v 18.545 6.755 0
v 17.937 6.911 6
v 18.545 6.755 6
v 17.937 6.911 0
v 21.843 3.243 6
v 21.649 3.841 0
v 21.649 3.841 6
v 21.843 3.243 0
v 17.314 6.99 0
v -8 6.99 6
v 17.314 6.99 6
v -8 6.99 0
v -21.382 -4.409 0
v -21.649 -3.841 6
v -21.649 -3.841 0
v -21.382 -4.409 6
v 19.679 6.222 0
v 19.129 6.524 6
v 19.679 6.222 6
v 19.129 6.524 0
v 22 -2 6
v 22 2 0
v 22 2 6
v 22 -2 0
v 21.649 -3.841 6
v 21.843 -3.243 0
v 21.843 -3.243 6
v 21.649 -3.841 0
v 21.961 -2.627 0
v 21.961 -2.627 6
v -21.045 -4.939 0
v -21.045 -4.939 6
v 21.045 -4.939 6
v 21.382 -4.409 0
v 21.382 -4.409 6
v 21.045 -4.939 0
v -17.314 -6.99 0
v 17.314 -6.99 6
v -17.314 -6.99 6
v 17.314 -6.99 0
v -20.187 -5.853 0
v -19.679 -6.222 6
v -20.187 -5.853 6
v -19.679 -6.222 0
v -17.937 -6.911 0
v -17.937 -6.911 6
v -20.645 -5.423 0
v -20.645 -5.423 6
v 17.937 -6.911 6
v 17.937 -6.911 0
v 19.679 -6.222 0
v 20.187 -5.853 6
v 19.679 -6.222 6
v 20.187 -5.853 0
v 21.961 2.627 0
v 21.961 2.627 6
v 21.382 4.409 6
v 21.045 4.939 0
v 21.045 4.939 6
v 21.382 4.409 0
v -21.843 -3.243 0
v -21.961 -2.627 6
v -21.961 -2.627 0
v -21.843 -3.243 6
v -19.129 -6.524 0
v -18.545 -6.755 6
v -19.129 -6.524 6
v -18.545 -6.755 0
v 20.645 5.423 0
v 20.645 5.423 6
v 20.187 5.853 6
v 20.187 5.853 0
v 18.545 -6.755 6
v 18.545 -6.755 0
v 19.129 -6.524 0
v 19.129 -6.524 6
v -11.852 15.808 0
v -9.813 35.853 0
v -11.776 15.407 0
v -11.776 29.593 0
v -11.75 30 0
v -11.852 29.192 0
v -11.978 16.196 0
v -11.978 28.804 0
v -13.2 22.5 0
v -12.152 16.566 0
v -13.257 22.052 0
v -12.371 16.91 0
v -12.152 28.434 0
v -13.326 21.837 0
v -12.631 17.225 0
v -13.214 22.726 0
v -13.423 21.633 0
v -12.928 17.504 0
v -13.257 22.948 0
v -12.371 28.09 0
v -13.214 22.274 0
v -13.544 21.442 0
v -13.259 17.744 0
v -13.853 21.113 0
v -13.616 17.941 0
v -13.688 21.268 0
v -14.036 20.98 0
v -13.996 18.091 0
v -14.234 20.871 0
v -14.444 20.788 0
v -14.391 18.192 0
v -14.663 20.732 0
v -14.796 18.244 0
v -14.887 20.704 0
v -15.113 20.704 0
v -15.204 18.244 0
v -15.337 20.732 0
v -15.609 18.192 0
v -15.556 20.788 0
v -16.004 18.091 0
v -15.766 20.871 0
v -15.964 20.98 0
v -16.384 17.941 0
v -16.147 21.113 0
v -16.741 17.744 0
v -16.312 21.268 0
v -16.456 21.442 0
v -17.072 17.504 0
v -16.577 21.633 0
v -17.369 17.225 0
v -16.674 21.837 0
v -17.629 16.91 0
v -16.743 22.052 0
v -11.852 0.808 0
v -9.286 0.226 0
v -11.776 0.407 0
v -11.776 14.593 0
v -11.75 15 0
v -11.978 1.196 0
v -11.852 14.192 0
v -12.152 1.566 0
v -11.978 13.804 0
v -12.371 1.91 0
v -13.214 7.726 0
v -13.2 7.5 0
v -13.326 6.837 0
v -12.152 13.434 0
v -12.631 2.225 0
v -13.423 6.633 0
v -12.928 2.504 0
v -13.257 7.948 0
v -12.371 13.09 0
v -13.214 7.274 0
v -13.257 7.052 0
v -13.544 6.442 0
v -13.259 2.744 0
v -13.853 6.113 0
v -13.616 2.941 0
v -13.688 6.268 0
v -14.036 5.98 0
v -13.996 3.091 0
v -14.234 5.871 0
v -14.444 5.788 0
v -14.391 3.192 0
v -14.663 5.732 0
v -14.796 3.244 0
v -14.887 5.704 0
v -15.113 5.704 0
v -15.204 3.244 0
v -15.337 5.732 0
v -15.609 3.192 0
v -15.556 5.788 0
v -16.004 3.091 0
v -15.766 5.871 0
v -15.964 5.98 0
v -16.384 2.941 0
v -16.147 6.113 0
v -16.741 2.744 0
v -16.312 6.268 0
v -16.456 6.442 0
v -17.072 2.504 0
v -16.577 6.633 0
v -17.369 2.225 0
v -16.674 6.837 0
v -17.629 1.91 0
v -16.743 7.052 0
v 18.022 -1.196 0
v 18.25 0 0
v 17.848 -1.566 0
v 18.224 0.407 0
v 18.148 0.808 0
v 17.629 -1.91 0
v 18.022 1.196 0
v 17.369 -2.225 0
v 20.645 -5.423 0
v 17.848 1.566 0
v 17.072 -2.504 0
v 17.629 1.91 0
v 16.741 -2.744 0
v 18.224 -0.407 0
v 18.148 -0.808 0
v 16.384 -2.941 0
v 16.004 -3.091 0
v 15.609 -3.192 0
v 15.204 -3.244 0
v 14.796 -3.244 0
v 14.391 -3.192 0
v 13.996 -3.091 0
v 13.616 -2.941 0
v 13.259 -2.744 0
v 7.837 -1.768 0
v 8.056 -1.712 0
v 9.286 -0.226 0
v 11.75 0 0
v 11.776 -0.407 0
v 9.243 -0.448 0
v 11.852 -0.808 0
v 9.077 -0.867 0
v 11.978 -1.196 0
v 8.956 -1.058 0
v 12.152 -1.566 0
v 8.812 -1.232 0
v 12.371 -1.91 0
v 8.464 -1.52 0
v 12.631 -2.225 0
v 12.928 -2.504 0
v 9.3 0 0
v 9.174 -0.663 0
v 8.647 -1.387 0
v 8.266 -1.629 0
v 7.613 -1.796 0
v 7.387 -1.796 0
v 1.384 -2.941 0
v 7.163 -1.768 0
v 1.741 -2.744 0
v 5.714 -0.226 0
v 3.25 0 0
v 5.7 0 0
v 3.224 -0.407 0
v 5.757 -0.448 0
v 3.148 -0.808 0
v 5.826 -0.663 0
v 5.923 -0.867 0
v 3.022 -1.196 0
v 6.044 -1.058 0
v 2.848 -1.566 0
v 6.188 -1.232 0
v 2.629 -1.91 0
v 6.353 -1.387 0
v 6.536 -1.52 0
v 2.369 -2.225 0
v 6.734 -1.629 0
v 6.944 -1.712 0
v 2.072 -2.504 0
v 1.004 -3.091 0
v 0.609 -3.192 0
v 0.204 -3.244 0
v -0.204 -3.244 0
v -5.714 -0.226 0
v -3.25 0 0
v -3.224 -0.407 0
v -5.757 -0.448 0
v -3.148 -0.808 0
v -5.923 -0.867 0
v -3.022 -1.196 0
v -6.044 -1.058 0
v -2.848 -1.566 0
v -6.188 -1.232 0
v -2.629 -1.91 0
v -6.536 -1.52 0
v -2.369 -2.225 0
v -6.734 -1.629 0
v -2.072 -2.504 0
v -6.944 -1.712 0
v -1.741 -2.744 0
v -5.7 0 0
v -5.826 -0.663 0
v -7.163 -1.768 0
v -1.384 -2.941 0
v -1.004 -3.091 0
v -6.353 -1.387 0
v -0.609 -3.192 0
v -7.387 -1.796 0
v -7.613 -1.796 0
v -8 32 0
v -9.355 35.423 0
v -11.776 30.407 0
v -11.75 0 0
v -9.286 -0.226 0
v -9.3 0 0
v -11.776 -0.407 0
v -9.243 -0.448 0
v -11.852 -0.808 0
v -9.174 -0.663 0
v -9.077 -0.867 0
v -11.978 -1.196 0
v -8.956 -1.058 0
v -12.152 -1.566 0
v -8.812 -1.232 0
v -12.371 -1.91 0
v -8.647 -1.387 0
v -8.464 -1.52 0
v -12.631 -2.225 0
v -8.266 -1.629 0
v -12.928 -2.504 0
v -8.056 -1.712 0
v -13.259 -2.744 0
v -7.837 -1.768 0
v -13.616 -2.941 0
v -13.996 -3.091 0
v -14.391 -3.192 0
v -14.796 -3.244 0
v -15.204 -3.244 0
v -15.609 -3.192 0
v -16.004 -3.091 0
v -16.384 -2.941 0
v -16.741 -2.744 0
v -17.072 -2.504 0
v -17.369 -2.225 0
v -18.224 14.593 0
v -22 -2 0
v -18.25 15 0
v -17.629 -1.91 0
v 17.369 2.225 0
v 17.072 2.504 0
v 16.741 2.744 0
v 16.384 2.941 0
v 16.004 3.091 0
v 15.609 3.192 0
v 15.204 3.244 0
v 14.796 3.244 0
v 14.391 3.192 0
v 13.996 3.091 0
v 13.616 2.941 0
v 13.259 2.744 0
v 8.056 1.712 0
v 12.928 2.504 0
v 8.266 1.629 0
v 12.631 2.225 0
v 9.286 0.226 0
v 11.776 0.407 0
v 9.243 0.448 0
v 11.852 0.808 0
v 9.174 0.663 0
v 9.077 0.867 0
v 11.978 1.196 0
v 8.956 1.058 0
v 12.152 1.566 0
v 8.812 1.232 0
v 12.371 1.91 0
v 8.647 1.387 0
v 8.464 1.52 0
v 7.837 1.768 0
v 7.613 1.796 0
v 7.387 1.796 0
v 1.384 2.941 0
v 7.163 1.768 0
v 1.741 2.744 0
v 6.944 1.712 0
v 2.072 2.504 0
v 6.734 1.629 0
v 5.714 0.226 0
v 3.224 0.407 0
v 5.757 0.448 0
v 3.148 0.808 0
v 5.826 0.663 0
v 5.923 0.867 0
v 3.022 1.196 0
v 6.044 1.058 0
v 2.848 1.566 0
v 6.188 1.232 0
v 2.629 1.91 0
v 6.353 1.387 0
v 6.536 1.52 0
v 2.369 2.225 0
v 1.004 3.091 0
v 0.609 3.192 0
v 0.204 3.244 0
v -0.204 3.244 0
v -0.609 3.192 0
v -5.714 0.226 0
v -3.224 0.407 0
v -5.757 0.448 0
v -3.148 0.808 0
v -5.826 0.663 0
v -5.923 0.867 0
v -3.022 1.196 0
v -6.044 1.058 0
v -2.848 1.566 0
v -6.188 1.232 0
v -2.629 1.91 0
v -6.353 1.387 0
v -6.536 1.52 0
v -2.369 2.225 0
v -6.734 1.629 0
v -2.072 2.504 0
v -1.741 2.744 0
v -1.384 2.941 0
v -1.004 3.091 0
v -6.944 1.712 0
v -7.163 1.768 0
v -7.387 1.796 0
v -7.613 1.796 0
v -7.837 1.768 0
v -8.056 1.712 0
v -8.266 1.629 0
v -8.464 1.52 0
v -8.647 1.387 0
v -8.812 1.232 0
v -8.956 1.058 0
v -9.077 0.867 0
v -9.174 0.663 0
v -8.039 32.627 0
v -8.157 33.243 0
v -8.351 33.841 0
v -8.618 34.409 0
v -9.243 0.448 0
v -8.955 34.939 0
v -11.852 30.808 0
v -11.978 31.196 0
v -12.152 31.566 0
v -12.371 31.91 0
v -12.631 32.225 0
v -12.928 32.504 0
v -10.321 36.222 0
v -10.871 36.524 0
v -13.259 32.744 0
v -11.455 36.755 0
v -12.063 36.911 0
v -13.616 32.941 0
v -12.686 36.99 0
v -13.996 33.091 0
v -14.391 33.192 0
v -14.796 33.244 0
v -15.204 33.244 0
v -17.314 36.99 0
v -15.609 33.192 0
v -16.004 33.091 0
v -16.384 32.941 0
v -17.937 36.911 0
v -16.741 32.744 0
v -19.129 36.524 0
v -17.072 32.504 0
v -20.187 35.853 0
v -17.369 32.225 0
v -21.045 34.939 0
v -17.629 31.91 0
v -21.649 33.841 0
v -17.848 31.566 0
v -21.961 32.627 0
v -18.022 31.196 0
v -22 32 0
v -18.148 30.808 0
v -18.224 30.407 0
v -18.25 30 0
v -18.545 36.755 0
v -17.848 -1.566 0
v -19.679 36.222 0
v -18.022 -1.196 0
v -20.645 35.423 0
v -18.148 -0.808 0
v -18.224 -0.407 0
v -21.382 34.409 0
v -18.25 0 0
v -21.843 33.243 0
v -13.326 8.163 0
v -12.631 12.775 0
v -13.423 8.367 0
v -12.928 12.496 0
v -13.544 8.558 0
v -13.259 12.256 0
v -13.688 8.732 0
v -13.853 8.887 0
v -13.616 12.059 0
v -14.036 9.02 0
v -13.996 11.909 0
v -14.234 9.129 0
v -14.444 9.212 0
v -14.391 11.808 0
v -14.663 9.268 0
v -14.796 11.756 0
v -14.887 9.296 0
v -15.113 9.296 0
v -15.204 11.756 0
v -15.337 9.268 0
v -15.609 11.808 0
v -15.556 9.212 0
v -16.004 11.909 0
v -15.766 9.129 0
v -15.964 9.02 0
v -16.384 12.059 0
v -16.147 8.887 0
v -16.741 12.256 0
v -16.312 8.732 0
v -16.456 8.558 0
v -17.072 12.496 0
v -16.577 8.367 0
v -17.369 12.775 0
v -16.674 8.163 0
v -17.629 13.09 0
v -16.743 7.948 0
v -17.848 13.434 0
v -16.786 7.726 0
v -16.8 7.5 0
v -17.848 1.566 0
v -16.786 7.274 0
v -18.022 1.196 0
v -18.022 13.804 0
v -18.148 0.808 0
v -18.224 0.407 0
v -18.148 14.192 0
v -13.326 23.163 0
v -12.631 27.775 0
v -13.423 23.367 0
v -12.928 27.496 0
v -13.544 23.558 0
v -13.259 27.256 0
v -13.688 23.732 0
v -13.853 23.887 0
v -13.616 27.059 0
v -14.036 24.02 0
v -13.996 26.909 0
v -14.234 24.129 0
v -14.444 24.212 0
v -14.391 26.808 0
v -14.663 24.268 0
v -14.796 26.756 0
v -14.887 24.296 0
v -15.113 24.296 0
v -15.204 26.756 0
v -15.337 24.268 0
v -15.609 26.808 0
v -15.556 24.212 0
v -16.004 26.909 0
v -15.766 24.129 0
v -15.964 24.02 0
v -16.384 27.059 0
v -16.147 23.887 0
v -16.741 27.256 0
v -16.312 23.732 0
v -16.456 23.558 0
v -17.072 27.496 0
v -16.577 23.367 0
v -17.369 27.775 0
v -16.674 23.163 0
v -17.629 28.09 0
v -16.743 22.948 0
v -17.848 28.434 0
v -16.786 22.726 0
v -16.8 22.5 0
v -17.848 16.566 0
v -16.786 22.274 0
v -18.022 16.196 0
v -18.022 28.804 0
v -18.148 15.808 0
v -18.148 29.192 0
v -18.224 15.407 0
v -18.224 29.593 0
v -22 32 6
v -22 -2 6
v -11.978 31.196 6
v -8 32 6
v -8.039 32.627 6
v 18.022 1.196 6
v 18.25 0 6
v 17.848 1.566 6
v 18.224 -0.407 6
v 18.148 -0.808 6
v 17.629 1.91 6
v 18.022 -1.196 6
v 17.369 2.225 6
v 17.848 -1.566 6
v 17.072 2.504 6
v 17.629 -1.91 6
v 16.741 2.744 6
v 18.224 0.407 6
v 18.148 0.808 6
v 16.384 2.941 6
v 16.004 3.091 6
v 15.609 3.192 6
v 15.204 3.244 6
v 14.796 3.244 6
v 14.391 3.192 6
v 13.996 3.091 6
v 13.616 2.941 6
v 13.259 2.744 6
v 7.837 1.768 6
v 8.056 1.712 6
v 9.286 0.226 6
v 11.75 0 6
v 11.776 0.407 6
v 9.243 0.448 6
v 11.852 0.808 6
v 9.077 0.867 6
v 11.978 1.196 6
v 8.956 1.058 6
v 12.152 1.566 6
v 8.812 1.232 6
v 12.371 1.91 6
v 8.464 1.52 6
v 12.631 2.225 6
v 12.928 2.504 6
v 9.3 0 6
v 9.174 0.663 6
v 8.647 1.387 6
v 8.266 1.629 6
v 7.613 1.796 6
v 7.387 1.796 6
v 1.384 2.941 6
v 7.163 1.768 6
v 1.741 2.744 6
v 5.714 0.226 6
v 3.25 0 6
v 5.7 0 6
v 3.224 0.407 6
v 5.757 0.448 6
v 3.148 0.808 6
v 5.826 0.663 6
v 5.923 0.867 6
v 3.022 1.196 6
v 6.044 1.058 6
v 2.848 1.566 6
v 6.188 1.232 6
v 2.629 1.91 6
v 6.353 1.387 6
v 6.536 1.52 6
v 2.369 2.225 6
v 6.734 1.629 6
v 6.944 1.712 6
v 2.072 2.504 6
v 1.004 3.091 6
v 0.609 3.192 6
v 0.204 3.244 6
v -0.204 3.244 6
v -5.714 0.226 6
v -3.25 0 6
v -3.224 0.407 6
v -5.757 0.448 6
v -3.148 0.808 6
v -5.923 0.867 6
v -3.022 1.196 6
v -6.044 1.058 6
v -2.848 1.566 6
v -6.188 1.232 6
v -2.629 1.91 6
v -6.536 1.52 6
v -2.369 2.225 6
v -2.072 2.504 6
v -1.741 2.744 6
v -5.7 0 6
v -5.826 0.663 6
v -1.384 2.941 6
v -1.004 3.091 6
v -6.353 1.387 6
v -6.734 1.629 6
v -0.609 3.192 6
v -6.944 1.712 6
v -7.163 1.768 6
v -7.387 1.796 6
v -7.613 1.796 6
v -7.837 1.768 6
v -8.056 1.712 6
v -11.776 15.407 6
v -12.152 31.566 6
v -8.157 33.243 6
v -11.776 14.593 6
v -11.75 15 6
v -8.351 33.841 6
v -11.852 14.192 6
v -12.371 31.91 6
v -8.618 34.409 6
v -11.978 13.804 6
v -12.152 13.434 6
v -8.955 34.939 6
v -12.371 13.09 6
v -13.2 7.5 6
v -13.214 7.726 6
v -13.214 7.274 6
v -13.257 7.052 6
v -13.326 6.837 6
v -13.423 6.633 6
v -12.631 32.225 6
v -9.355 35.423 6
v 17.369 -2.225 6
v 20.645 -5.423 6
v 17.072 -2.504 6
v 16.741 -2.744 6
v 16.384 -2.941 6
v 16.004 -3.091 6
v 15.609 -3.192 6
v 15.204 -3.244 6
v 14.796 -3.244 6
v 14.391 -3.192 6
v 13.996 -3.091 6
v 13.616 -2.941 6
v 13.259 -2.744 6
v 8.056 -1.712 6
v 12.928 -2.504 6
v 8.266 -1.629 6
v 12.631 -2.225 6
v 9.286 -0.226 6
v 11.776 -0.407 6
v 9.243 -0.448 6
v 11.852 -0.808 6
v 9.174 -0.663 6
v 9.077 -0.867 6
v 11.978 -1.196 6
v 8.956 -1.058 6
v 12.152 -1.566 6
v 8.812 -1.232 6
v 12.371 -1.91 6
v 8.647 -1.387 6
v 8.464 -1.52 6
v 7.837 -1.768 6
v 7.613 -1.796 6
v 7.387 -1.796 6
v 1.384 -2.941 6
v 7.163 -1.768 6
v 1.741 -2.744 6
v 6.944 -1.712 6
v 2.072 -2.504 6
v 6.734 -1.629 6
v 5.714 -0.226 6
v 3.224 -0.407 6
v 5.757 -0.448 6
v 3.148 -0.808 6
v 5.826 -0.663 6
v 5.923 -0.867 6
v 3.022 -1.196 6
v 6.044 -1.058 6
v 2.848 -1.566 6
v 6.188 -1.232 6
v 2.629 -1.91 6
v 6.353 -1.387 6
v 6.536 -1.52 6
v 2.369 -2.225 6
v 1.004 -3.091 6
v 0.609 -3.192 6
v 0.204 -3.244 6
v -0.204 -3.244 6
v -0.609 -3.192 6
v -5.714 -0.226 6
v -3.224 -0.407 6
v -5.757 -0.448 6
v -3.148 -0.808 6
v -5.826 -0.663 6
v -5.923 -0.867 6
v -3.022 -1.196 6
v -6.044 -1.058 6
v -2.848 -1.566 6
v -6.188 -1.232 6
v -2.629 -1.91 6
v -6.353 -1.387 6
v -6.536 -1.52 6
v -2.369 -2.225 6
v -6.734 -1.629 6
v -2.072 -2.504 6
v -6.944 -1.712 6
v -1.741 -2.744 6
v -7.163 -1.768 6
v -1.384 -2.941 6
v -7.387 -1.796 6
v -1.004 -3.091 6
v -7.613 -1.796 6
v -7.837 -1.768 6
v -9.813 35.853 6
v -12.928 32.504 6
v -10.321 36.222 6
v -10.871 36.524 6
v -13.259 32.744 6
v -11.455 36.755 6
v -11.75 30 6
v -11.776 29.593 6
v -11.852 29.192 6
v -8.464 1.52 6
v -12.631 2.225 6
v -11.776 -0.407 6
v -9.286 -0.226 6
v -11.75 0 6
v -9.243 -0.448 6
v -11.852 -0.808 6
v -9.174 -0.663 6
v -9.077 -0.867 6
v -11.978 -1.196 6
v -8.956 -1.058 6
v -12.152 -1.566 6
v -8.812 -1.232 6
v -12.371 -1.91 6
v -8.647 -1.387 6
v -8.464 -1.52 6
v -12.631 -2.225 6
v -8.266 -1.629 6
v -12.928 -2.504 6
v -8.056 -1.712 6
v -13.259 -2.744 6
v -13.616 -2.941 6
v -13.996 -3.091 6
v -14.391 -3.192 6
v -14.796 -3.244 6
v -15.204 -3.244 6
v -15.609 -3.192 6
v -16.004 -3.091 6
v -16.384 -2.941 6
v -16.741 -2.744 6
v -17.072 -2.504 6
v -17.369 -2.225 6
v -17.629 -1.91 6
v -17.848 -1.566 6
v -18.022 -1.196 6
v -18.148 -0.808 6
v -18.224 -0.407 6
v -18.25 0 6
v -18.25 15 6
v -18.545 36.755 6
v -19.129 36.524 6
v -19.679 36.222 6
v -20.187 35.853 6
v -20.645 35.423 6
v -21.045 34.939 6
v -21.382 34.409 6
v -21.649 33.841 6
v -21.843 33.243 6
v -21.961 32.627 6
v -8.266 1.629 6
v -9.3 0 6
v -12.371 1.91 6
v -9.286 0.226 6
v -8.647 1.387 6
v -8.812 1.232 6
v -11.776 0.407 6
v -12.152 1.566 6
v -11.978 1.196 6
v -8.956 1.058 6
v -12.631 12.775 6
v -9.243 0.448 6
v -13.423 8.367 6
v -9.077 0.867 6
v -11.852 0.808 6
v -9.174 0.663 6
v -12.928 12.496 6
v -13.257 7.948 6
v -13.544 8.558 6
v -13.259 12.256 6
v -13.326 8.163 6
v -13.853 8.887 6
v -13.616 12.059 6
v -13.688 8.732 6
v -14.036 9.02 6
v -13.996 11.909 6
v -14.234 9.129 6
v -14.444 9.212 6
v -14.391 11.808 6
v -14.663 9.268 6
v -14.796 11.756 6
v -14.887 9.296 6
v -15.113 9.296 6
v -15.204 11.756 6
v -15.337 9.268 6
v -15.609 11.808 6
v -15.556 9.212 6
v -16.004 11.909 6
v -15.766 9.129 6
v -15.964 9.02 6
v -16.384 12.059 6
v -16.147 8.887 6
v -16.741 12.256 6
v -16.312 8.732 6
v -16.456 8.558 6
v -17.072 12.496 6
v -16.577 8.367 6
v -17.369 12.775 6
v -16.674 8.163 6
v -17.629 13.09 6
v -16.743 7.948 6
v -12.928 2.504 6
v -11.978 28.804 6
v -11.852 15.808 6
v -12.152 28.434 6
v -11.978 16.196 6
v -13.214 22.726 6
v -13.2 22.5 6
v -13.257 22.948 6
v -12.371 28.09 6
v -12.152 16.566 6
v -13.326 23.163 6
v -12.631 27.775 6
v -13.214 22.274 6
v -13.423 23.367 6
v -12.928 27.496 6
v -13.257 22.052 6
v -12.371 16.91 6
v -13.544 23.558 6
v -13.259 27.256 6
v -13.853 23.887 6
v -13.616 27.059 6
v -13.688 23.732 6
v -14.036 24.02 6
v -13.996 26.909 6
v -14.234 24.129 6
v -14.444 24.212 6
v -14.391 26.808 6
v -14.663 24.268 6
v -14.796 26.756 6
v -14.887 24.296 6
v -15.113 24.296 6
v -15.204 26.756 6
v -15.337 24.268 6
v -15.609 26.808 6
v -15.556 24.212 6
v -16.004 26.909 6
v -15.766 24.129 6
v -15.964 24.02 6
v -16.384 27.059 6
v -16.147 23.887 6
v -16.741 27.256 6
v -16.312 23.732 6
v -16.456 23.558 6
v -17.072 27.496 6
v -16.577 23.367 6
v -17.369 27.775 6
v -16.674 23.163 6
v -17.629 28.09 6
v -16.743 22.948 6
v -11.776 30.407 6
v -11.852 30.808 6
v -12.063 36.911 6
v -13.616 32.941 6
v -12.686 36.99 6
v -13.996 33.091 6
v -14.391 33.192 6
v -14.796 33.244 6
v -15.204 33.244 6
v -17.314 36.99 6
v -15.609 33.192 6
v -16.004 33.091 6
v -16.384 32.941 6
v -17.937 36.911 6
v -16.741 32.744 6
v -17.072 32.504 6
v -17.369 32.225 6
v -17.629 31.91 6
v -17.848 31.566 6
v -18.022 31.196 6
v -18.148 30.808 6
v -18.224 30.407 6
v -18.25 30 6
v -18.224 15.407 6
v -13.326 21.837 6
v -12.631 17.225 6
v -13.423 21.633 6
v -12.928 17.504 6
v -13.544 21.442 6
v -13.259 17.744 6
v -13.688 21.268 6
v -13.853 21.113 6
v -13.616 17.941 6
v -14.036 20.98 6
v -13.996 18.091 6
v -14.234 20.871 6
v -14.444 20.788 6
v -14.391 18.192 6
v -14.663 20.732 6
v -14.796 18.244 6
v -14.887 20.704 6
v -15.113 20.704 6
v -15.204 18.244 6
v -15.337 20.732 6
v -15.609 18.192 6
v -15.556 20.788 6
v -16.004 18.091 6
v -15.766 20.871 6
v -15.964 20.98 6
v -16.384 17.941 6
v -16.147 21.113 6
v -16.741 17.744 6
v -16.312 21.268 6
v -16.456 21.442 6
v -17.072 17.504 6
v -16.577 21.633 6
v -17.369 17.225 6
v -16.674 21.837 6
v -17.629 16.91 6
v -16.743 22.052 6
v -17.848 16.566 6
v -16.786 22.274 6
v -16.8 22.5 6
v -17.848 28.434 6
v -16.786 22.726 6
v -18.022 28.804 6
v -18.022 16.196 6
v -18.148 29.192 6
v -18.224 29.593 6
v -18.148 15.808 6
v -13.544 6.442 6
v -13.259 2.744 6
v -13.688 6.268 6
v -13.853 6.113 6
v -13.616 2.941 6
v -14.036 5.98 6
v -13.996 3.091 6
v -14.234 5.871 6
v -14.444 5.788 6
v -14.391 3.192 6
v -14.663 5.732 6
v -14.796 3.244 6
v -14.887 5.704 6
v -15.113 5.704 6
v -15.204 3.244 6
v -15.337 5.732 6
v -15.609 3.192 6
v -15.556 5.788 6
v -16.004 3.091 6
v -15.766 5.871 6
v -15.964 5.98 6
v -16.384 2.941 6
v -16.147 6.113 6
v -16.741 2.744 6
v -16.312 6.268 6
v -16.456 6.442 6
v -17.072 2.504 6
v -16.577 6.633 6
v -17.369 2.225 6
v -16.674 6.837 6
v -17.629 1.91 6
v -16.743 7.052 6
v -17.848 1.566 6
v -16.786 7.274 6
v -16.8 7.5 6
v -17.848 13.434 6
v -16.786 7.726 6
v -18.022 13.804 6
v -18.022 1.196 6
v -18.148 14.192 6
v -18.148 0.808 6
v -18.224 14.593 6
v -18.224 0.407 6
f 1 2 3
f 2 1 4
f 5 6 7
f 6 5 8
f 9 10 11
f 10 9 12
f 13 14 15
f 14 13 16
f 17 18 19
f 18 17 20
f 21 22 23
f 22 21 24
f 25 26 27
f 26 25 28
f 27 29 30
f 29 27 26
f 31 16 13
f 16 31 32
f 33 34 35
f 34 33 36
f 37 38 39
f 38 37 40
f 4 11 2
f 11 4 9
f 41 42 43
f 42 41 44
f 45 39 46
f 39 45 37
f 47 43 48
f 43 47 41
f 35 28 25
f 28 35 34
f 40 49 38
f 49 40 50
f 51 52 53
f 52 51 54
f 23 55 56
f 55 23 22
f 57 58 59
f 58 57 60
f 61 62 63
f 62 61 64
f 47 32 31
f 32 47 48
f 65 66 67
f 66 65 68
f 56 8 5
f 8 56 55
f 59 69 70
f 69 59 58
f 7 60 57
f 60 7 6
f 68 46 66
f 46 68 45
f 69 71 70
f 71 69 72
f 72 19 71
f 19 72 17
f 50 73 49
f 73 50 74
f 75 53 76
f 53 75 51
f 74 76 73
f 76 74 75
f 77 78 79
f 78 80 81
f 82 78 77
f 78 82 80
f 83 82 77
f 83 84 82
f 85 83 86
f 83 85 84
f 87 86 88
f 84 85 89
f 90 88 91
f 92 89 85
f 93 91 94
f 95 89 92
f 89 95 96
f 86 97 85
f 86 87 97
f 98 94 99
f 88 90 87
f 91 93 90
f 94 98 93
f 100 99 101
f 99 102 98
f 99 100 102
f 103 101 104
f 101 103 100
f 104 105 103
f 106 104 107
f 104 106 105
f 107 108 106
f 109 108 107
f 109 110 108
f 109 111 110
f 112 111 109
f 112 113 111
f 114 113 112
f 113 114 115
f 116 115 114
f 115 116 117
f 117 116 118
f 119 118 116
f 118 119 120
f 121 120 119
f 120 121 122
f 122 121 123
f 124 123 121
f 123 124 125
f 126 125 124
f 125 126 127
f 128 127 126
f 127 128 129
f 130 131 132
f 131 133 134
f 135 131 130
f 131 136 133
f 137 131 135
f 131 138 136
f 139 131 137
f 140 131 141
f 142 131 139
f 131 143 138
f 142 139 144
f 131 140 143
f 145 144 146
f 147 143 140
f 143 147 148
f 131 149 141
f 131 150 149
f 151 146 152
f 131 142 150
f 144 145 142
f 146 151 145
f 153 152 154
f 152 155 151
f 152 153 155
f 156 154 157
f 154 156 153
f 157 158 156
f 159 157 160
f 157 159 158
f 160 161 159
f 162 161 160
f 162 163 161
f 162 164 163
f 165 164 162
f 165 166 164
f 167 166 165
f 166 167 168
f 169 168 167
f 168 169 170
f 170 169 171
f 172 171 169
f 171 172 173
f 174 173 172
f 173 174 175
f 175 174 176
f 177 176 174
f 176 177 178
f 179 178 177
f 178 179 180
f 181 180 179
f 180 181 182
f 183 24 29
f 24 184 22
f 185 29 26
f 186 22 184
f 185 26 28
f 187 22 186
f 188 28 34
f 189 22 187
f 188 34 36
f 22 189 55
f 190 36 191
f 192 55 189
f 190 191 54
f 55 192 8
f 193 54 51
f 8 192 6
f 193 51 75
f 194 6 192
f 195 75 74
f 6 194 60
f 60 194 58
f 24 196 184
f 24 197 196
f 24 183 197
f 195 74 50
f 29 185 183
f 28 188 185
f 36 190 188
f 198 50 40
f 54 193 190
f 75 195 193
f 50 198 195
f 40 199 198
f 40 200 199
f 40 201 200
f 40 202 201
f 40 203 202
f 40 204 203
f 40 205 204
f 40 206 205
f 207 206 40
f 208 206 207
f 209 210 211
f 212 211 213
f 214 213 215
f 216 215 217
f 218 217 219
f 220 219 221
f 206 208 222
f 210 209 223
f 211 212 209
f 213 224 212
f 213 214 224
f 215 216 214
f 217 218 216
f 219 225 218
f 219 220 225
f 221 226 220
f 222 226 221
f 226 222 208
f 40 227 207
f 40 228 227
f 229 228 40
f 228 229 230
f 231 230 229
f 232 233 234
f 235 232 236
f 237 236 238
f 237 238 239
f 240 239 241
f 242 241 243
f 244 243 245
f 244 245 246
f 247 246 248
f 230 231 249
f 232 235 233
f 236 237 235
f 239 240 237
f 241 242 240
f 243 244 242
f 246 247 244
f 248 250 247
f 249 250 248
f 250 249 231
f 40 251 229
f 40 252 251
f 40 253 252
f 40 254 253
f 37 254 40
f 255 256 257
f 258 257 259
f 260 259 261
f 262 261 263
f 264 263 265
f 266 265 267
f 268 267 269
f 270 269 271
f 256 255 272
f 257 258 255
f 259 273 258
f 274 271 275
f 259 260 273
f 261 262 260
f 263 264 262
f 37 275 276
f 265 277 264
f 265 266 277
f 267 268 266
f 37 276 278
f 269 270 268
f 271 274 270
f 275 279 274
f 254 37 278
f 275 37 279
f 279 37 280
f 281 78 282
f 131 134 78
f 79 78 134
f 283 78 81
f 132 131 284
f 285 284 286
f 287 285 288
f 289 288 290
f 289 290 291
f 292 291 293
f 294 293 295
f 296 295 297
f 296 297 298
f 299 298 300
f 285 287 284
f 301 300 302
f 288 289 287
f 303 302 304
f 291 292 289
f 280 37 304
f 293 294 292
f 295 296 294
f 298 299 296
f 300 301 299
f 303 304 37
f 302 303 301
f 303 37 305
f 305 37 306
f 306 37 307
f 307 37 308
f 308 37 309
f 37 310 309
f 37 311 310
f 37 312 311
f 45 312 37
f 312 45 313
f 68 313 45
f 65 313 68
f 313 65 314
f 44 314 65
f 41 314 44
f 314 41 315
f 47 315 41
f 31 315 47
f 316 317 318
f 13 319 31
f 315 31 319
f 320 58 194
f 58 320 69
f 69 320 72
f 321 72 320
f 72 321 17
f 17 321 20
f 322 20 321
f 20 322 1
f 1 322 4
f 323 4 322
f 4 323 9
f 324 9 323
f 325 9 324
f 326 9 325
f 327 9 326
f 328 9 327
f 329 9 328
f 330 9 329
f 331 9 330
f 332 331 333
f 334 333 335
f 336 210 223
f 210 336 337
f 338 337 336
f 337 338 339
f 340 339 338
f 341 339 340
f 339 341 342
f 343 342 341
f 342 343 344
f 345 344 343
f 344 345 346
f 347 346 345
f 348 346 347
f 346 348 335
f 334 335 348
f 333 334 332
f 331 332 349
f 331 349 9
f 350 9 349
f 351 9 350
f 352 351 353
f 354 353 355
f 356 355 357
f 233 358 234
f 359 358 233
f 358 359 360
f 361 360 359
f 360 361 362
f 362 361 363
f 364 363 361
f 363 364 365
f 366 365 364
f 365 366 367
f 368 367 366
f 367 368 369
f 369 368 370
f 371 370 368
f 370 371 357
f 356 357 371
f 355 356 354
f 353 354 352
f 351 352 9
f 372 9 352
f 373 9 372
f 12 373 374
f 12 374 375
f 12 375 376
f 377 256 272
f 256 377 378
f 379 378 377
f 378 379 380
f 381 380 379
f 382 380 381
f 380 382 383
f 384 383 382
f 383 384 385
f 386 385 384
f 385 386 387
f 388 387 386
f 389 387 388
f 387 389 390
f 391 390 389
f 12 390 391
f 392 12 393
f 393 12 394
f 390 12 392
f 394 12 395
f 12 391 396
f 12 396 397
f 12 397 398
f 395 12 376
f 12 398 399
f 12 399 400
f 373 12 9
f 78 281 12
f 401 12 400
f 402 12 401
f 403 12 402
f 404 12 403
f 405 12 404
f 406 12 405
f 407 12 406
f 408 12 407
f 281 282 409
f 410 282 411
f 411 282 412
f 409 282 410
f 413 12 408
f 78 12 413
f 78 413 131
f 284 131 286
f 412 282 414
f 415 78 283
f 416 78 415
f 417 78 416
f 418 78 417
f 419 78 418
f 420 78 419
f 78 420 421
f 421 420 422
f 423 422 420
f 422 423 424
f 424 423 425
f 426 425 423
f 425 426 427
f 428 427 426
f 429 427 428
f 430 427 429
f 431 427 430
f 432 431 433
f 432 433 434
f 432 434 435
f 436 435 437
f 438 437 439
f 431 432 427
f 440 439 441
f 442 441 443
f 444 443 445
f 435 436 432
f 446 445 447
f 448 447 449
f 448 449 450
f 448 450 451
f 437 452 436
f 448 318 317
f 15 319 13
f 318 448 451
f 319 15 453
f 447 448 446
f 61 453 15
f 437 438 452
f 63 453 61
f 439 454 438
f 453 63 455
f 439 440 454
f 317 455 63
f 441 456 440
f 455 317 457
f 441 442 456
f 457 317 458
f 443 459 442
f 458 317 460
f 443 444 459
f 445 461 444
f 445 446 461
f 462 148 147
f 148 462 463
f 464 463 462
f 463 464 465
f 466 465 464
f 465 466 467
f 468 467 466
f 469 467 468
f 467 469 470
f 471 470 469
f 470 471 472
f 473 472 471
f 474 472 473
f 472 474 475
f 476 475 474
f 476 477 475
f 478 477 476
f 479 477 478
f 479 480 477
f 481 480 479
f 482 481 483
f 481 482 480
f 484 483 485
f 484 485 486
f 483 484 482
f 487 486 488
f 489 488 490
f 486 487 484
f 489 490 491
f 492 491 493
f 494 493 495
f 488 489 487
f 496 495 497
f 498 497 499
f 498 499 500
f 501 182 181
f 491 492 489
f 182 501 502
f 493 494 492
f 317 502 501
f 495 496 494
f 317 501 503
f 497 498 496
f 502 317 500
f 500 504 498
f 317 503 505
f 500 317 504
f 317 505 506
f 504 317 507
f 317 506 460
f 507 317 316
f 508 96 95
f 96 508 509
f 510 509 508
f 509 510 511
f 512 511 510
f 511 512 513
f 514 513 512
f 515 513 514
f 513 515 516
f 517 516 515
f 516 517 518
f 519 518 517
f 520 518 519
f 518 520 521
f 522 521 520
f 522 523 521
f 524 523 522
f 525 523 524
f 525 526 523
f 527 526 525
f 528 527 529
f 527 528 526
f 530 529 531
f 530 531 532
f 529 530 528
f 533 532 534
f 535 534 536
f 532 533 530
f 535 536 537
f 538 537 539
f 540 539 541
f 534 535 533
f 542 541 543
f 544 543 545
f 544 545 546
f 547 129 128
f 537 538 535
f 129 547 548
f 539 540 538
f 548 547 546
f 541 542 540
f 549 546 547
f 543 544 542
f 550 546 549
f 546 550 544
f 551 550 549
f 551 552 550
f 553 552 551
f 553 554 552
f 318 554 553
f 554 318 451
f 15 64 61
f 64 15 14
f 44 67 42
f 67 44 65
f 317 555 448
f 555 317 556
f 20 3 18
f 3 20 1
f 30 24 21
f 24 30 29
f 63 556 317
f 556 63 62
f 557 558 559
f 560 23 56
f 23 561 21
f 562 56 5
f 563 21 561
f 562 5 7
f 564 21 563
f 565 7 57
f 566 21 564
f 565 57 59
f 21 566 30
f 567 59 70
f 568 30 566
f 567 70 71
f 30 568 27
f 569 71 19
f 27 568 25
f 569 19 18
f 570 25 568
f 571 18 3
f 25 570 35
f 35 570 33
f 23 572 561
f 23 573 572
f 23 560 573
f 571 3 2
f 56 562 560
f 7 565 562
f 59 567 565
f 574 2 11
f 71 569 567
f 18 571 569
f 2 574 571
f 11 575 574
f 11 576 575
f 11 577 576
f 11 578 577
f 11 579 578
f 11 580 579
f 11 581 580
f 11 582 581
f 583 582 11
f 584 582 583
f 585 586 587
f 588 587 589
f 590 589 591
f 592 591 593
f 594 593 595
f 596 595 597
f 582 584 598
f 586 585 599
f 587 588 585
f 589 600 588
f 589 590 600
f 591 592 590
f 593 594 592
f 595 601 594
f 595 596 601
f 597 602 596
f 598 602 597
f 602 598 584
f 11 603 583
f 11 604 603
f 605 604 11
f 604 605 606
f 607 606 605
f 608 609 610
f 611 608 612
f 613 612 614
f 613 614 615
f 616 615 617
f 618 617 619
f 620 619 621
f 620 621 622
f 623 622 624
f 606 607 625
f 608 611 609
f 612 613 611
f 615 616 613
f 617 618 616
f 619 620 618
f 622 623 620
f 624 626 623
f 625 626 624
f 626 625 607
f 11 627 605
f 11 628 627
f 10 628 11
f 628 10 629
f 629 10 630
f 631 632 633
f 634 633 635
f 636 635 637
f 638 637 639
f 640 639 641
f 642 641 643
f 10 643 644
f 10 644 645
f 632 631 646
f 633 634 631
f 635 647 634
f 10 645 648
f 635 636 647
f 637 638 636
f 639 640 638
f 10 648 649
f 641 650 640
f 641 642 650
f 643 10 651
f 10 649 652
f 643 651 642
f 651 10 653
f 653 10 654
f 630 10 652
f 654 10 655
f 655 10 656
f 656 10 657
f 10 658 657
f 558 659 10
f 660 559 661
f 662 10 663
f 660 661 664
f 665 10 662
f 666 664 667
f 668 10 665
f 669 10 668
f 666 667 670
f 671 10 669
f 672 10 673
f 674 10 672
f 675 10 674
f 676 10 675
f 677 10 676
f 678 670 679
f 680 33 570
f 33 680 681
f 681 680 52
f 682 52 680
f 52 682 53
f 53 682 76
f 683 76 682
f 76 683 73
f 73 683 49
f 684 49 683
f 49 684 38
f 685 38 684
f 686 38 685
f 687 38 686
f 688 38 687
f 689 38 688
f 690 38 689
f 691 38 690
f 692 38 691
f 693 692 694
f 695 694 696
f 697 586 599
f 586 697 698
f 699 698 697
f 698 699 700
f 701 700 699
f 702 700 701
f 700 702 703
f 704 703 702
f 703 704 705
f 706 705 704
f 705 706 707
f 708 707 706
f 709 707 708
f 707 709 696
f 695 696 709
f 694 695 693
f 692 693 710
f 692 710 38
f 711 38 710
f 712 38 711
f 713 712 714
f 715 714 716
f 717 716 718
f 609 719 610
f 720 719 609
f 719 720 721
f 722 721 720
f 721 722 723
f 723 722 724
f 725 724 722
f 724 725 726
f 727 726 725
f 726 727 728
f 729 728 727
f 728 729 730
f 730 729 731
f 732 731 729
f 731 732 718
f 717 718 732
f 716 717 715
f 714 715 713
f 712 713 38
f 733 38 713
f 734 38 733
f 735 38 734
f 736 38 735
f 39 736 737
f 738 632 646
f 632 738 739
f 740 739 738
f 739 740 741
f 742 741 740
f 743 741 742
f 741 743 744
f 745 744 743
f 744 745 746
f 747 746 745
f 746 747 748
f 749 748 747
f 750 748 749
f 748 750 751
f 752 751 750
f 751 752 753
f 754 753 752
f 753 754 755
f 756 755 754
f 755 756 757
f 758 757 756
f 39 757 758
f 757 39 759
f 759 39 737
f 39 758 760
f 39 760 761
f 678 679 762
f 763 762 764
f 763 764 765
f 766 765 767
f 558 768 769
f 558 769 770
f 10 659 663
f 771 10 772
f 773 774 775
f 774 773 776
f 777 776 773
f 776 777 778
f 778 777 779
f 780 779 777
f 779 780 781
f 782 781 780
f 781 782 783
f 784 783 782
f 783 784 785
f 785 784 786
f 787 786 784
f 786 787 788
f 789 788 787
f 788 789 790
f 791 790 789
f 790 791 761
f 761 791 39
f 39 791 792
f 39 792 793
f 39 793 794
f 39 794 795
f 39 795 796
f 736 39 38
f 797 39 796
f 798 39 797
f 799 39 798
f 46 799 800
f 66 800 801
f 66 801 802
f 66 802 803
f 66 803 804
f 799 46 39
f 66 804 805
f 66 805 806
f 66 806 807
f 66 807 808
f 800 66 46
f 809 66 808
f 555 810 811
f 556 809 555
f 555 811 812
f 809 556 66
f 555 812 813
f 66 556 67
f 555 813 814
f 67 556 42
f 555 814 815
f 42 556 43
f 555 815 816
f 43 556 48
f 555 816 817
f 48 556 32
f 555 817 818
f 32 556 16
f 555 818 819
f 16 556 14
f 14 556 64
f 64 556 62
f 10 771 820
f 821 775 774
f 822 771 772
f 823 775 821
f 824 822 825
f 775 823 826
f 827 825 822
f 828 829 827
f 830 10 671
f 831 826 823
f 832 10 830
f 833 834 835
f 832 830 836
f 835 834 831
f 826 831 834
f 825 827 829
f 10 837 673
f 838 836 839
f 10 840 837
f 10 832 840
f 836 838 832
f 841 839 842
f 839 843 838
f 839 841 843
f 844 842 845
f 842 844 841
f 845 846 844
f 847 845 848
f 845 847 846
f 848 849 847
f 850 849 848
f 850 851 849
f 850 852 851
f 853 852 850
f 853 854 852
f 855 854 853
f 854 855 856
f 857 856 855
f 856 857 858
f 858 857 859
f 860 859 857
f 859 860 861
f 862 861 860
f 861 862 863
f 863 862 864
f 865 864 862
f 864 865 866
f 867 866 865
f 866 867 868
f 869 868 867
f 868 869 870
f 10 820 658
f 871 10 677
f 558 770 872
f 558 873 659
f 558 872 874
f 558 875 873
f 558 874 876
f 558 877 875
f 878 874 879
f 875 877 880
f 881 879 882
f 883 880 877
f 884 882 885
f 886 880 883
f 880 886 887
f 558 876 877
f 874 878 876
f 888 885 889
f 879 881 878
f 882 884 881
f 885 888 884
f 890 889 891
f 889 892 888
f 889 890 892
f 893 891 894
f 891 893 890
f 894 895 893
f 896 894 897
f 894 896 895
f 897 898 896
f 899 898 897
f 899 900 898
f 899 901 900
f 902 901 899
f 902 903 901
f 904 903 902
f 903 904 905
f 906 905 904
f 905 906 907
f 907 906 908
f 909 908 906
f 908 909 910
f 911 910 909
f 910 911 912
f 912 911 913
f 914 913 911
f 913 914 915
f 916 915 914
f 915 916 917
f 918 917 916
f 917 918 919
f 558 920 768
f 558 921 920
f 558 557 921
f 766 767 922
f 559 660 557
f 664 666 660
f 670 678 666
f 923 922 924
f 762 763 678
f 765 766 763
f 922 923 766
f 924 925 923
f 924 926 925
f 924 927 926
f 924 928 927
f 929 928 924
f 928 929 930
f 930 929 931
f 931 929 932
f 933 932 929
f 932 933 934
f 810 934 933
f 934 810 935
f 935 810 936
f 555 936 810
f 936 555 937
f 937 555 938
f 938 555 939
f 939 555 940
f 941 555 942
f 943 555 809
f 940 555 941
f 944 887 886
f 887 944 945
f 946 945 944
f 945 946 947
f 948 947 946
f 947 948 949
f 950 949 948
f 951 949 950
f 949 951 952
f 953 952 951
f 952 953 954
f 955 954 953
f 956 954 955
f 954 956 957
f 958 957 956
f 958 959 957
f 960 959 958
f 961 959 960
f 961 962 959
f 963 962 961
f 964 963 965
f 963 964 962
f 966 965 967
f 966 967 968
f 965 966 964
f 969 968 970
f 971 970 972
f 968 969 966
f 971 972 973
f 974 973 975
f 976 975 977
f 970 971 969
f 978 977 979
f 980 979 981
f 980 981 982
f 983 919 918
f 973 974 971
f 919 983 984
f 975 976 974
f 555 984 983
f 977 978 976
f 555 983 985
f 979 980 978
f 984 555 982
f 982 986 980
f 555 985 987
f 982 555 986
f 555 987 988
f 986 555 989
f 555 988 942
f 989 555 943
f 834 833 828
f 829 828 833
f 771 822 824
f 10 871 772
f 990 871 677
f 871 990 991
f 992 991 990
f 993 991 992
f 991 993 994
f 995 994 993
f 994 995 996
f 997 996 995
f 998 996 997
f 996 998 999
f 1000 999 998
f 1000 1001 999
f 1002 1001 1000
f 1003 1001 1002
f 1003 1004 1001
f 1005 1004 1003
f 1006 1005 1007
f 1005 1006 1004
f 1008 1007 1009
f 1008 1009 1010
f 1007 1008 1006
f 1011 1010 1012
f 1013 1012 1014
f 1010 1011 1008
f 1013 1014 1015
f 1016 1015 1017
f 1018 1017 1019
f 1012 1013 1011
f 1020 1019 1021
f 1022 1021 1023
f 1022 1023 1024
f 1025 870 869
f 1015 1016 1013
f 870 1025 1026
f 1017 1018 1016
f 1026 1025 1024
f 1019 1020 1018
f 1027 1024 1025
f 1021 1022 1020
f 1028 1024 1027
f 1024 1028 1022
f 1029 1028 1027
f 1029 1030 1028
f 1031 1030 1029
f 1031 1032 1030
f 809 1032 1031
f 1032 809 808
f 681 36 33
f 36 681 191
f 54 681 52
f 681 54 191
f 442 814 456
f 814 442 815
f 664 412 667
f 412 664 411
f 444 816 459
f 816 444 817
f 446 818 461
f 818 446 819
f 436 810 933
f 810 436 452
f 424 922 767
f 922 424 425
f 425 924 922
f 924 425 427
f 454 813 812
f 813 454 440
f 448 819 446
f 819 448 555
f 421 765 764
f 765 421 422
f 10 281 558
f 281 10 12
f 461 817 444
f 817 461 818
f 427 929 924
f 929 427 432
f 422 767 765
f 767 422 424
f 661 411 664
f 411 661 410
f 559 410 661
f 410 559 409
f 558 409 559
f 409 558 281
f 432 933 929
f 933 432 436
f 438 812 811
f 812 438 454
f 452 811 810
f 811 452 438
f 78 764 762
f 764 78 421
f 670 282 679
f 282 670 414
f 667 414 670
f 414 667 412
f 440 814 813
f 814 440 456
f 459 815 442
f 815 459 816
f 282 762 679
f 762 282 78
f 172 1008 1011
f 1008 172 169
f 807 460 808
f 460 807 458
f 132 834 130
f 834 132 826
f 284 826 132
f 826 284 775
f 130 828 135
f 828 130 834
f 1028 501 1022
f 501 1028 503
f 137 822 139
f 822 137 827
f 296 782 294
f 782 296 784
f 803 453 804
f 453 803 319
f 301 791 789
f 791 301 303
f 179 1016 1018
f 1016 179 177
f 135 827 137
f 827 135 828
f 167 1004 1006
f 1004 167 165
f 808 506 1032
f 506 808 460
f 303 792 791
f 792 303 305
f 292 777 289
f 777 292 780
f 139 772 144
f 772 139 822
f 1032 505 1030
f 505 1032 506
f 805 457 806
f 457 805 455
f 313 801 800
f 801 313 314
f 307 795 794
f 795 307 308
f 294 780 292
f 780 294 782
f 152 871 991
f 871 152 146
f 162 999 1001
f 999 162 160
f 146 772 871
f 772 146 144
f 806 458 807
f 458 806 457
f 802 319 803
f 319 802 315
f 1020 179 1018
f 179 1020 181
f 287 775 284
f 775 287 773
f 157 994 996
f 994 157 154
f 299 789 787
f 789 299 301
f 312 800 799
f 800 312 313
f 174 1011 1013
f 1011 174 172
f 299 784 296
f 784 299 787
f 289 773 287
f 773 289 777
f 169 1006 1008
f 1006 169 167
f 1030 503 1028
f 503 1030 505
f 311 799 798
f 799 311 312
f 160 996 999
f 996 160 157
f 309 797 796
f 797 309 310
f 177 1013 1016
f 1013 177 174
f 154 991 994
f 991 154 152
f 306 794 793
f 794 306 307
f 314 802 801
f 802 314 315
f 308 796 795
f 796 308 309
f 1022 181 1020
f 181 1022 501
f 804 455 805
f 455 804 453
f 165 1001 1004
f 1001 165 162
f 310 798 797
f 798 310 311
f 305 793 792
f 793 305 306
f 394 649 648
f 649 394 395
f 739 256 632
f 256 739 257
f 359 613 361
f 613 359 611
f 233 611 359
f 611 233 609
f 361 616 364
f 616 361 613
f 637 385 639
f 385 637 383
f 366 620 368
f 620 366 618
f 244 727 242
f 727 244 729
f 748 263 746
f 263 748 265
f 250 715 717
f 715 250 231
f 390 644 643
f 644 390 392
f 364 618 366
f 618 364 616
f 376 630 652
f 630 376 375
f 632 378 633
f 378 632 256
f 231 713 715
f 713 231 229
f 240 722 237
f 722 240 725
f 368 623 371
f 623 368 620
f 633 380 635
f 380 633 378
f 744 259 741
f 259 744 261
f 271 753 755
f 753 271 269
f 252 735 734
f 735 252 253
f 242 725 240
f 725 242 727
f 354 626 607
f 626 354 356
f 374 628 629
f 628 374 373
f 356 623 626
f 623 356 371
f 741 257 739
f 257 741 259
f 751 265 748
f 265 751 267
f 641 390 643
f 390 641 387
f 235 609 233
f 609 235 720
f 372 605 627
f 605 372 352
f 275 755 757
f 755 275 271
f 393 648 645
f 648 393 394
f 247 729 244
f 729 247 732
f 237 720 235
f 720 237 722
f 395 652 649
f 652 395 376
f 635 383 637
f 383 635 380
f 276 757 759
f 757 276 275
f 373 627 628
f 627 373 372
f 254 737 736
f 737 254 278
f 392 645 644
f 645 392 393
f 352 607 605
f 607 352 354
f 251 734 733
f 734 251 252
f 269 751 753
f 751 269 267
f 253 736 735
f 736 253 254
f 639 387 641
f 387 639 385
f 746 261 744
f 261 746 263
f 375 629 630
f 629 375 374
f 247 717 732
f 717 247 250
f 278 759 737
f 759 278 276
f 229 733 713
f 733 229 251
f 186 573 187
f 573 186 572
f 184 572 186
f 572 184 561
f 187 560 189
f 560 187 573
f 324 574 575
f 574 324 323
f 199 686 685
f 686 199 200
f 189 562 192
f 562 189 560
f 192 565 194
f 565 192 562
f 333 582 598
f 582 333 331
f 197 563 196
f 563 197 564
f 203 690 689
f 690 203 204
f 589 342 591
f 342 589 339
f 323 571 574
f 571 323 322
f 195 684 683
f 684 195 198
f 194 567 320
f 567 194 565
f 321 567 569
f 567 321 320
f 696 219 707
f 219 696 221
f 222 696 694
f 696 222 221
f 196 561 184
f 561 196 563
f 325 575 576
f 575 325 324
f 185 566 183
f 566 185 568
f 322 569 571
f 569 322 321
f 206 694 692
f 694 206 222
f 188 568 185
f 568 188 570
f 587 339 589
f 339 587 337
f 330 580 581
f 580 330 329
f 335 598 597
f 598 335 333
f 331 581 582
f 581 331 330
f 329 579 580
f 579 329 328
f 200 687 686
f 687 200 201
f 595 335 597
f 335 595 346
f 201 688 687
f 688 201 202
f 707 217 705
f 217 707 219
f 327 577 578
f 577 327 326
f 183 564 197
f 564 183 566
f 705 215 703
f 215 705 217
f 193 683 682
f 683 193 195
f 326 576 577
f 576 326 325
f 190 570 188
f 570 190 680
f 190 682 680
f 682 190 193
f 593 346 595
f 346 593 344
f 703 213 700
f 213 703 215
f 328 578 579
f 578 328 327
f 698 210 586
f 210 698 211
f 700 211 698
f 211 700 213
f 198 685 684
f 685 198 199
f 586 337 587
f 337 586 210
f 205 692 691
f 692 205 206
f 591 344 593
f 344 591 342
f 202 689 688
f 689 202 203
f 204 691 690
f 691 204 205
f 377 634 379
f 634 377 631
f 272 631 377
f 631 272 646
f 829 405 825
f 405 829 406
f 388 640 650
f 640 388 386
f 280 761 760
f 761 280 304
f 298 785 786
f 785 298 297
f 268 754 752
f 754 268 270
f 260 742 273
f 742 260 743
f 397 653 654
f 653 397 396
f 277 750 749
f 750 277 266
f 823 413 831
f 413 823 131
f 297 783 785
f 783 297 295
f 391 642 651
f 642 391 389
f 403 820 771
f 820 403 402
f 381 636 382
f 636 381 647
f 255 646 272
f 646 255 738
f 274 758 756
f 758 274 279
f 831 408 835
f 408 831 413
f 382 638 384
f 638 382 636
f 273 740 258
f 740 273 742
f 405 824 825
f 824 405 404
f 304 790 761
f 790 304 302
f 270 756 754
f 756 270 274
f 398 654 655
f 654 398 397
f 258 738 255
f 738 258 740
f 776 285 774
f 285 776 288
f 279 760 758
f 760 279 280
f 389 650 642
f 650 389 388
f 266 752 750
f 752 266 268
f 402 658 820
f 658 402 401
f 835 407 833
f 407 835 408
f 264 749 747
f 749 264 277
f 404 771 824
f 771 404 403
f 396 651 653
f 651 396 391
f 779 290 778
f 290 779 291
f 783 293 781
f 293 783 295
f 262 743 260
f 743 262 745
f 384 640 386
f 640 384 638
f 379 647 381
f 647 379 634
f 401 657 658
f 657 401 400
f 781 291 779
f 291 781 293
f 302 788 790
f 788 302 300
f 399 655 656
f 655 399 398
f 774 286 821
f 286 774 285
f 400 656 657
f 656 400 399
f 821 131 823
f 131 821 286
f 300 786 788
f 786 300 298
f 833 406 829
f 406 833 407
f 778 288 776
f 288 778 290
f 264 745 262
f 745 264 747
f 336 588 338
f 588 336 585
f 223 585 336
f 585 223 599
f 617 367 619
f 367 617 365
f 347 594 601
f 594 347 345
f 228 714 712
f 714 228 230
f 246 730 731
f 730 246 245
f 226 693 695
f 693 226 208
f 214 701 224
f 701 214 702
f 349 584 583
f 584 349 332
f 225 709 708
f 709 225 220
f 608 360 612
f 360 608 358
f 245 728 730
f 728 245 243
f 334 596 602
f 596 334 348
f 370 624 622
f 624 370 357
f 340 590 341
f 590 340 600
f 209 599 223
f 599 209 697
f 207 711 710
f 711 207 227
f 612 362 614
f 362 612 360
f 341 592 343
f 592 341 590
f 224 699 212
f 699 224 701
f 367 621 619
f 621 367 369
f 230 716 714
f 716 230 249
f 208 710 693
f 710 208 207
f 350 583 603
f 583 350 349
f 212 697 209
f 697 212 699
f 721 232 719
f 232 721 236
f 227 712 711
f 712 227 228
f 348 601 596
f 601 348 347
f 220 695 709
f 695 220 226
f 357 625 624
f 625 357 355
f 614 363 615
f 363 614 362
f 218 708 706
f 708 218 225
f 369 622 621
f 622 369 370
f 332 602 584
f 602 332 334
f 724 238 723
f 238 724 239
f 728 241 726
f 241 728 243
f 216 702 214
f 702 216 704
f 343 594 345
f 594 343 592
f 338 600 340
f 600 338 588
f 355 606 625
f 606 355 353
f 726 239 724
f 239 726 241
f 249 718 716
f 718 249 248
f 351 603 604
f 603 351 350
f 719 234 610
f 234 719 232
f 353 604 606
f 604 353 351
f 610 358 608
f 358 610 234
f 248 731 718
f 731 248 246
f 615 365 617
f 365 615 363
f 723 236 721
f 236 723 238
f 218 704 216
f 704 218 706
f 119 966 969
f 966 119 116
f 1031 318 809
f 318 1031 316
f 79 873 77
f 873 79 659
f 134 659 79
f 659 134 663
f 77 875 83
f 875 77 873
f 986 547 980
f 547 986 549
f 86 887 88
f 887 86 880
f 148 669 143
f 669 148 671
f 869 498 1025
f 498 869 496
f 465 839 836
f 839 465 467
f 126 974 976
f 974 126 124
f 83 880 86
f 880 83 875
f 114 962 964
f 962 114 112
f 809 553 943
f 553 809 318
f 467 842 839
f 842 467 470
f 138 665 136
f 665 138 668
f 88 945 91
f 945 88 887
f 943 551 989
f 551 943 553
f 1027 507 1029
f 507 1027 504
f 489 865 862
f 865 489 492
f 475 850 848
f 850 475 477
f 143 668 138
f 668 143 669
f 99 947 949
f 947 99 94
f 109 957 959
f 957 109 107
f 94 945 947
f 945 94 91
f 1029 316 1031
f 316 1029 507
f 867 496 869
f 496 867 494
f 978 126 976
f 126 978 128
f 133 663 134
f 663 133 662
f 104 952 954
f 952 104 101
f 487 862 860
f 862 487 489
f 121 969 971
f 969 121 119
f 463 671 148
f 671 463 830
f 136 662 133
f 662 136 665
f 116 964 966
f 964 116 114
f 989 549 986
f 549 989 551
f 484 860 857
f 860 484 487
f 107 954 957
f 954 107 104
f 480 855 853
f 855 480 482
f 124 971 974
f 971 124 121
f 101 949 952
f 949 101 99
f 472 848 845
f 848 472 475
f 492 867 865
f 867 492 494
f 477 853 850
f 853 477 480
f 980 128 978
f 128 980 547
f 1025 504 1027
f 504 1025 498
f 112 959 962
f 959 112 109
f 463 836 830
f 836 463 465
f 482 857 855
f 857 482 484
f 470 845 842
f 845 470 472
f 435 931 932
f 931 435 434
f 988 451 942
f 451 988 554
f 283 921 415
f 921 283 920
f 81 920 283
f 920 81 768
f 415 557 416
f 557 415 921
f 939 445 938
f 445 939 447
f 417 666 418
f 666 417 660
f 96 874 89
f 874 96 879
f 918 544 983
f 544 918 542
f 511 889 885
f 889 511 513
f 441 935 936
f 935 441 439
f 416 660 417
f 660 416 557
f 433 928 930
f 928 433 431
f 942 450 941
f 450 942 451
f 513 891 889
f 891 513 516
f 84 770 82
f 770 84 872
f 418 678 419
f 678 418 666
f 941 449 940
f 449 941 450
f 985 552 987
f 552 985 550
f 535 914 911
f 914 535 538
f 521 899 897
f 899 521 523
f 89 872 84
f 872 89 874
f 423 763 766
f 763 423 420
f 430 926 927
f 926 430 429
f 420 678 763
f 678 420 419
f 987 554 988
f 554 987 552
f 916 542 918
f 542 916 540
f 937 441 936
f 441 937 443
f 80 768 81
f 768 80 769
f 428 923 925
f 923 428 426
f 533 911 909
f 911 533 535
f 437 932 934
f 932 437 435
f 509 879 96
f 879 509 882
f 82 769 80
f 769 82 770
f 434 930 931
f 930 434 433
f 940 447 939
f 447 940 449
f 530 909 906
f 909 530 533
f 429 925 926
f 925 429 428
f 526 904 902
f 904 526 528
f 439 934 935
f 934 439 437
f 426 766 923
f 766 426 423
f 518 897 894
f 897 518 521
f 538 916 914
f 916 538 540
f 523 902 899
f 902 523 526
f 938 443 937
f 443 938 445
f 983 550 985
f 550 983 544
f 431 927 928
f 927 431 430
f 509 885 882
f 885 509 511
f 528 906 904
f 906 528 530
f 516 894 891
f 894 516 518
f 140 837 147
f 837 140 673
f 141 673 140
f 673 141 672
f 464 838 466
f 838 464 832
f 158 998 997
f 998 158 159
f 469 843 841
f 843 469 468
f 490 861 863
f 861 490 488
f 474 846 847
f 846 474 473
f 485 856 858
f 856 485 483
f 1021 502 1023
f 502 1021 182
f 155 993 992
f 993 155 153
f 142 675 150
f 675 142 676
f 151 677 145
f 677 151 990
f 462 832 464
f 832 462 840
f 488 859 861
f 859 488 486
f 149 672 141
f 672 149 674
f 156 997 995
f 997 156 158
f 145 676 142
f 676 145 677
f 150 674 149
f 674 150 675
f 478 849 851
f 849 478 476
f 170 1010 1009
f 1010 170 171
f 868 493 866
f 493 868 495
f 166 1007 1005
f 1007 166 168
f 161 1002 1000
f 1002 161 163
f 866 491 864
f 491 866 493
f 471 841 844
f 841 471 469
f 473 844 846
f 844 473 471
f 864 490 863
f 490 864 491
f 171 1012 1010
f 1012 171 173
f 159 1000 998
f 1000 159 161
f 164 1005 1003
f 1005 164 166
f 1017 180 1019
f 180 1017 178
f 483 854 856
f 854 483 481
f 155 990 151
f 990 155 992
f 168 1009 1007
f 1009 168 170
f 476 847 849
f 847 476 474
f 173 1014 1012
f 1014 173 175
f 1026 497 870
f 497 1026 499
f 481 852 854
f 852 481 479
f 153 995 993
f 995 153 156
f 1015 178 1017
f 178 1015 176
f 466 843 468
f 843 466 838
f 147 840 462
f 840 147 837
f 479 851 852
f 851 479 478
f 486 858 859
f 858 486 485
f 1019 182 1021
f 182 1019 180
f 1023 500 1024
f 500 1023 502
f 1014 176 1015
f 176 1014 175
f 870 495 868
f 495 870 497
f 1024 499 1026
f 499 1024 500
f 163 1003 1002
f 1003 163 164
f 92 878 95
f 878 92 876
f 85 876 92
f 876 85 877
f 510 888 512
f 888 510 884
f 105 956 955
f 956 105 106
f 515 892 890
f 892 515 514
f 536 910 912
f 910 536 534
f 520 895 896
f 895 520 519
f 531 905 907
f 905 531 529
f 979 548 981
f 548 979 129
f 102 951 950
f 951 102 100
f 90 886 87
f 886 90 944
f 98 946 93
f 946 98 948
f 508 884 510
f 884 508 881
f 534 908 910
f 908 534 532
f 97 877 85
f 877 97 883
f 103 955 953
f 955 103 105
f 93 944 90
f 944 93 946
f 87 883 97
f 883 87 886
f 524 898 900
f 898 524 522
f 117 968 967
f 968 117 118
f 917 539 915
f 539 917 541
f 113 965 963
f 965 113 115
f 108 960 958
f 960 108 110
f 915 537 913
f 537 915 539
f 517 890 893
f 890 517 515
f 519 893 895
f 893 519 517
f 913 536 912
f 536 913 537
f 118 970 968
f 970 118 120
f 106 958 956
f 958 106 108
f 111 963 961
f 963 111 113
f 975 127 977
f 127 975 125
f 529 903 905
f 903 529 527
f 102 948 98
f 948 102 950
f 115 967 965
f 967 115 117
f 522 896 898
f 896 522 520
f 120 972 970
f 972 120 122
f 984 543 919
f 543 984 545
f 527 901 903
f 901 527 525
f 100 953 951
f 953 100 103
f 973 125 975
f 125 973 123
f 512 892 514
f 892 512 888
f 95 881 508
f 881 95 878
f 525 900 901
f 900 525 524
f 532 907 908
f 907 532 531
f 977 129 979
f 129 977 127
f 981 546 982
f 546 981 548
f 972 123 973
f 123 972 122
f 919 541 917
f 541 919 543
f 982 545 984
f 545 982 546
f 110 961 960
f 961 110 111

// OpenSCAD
$fn = 50;


difference() {
	union() {
		*color(alpha = 1.0000000000, c = "gray") {
			translate(v = [0, 7, 0]) {
				linear_extrude(height = 1) {
					text(font = "Arial:style=Bold", halign = "center", size = 4.5000000000, text = "COMMENT plate main", valign = "center");
				}
			}
		}
		hull() {
			translate(v = [-17.0000000000, 2.0000000000, 0]) {
				cylinder(h = 6, r = 5);
			}
			translate(v = [17.0000000000, 2.0000000000, 0]) {
				cylinder(h = 6, r = 5);
			}
			translate(v = [-17.0000000000, -2.0000000000, 0]) {
				cylinder(h = 6, r = 5);
			}
			translate(v = [17.0000000000, -2.0000000000, 0]) {
				cylinder(h = 6, r = 5);
			}
		}
		*color(alpha = 1.0000000000, c = "gray") {
			translate(v = [0, 7, 0]) {
				linear_extrude(height = 1) {
					text(font = "Arial:style=Bold", halign = "center", size = 4.5000000000, text = "COMMENT plate main", valign = "center");
				}
			}
		}
		translate(v = [-15.0000000000, 15.0000000000, 0]) {
			hull() {
				translate(v = [-2.0000000000, 17.0000000000, 0]) {
					cylinder(h = 6, r = 5);
				}
				translate(v = [2.0000000000, 17.0000000000, 0]) {
					cylinder(h = 6, r = 5);
				}
				translate(v = [-2.0000000000, -17.0000000000, 0]) {
					cylinder(h = 6, r = 5);
				}
				translate(v = [2.0000000000, -17.0000000000, 0]) {
					cylinder(h = 6, r = 5);
				}
			}
		}
	}
	union() {
		*color(alpha = 1.0000000000, c = "gray") {
			translate(v = [0, 7, 0]) {
				linear_extrude(height = 1) {
					text(font = "Arial:style=Bold", halign = "center", size = 4.5000000000, text = "COMMENT holes main", valign = "center");
				}
			}
		}
		translate(v = [-15.0000000000, 0.0000000000, 0]) {
			translate(v = [0, 0, -100]) {
				cylinder(h = 200, r = 3.2500000000);
			}
		}
		translate(v = [0, 0, -100]) {
			cylinder(h = 200, r = 3.2500000000);
		}
		translate(v = [15.0000000000, 0.0000000000, 0]) {
			translate(v = [0, 0, -100]) {
				cylinder(h = 200, r = 3.2500000000);
			}
		}
		translate(v = [-15.0000000000, 0.0000000000, 0]) {
			translate(v = [0, 0, -100]) {
				cylinder(h = 200, r = 1.8000000000);
			}
		}
		translate(v = [-7.5000000000, 0.0000000000, 0]) {
			translate(v = [0, 0, -100]) {
				cylinder(h = 200, r = 1.8000000000);
			}
		}
		translate(v = [0, 0, -100]) {
			cylinder(h = 200, r = 1.8000000000);
		}
		translate(v = [7.5000000000, 0.0000000000, 0]) {
			translate(v = [0, 0, -100]) {
				cylinder(h = 200, r = 1.8000000000);
			}
		}
		translate(v = [15.0000000000, 0.0000000000, 0]) {
			translate(v = [0, 0, -100]) {
				cylinder(h = 200, r = 1.8000000000);
			}
		}
		*color(alpha = 1.0000000000, c = "gray") {
			translate(v = [0, 7, 0]) {
				linear_extrude(height = 1) {
					text(font = "Arial:style=Bold", halign = "center", size = 4.5000000000, text = "COMMENT holes main", valign = "center");
				}
			}
		}
		translate(v = [-15.0000000000, 0.0000000000, 0]) {
			translate(v = [0, 0, -100]) {
				cylinder(h = 200, r = 3.2500000000);
			}
		}
		translate(v = [-15.0000000000, 15.0000000000, 0]) {
			translate(v = [0, 0, -100]) {
				cylinder(h = 200, r = 3.2500000000);
			}
		}
		translate(v = [-15.0000000000, 30.0000000000, 0]) {
			translate(v = [0, 0, -100]) {
				cylinder(h = 200, r = 3.2500000000);
			}
		}
		translate(v = [-15.0000000000, 0.0000000000, 0]) {
			translate(v = [0, 0, -100]) {
				cylinder(h = 200, r = 1.8000000000);
			}
		}
		translate(v = [-15.0000000000, 7.5000000000, 0]) {
			translate(v = [0, 0, -100]) {
				cylinder(h = 200, r = 1.8000000000);
			}
		}
		translate(v = [-15.0000000000, 15.0000000000, 0]) {
			translate(v = [0, 0, -100]) {
				cylinder(h = 200, r = 1.8000000000);
			}
		}
		translate(v = [-15.0000000000, 22.5000000000, 0]) {
			translate(v = [0, 0, -100]) {
				cylinder(h = 200, r = 1.8000000000);
			}
		}
		translate(v = [-15.0000000000, 30.0000000000, 0]) {
			translate(v = [0, 0, -100]) {
				cylinder(h = 200, r = 1.8000000000);
			}
		}
	}
}
